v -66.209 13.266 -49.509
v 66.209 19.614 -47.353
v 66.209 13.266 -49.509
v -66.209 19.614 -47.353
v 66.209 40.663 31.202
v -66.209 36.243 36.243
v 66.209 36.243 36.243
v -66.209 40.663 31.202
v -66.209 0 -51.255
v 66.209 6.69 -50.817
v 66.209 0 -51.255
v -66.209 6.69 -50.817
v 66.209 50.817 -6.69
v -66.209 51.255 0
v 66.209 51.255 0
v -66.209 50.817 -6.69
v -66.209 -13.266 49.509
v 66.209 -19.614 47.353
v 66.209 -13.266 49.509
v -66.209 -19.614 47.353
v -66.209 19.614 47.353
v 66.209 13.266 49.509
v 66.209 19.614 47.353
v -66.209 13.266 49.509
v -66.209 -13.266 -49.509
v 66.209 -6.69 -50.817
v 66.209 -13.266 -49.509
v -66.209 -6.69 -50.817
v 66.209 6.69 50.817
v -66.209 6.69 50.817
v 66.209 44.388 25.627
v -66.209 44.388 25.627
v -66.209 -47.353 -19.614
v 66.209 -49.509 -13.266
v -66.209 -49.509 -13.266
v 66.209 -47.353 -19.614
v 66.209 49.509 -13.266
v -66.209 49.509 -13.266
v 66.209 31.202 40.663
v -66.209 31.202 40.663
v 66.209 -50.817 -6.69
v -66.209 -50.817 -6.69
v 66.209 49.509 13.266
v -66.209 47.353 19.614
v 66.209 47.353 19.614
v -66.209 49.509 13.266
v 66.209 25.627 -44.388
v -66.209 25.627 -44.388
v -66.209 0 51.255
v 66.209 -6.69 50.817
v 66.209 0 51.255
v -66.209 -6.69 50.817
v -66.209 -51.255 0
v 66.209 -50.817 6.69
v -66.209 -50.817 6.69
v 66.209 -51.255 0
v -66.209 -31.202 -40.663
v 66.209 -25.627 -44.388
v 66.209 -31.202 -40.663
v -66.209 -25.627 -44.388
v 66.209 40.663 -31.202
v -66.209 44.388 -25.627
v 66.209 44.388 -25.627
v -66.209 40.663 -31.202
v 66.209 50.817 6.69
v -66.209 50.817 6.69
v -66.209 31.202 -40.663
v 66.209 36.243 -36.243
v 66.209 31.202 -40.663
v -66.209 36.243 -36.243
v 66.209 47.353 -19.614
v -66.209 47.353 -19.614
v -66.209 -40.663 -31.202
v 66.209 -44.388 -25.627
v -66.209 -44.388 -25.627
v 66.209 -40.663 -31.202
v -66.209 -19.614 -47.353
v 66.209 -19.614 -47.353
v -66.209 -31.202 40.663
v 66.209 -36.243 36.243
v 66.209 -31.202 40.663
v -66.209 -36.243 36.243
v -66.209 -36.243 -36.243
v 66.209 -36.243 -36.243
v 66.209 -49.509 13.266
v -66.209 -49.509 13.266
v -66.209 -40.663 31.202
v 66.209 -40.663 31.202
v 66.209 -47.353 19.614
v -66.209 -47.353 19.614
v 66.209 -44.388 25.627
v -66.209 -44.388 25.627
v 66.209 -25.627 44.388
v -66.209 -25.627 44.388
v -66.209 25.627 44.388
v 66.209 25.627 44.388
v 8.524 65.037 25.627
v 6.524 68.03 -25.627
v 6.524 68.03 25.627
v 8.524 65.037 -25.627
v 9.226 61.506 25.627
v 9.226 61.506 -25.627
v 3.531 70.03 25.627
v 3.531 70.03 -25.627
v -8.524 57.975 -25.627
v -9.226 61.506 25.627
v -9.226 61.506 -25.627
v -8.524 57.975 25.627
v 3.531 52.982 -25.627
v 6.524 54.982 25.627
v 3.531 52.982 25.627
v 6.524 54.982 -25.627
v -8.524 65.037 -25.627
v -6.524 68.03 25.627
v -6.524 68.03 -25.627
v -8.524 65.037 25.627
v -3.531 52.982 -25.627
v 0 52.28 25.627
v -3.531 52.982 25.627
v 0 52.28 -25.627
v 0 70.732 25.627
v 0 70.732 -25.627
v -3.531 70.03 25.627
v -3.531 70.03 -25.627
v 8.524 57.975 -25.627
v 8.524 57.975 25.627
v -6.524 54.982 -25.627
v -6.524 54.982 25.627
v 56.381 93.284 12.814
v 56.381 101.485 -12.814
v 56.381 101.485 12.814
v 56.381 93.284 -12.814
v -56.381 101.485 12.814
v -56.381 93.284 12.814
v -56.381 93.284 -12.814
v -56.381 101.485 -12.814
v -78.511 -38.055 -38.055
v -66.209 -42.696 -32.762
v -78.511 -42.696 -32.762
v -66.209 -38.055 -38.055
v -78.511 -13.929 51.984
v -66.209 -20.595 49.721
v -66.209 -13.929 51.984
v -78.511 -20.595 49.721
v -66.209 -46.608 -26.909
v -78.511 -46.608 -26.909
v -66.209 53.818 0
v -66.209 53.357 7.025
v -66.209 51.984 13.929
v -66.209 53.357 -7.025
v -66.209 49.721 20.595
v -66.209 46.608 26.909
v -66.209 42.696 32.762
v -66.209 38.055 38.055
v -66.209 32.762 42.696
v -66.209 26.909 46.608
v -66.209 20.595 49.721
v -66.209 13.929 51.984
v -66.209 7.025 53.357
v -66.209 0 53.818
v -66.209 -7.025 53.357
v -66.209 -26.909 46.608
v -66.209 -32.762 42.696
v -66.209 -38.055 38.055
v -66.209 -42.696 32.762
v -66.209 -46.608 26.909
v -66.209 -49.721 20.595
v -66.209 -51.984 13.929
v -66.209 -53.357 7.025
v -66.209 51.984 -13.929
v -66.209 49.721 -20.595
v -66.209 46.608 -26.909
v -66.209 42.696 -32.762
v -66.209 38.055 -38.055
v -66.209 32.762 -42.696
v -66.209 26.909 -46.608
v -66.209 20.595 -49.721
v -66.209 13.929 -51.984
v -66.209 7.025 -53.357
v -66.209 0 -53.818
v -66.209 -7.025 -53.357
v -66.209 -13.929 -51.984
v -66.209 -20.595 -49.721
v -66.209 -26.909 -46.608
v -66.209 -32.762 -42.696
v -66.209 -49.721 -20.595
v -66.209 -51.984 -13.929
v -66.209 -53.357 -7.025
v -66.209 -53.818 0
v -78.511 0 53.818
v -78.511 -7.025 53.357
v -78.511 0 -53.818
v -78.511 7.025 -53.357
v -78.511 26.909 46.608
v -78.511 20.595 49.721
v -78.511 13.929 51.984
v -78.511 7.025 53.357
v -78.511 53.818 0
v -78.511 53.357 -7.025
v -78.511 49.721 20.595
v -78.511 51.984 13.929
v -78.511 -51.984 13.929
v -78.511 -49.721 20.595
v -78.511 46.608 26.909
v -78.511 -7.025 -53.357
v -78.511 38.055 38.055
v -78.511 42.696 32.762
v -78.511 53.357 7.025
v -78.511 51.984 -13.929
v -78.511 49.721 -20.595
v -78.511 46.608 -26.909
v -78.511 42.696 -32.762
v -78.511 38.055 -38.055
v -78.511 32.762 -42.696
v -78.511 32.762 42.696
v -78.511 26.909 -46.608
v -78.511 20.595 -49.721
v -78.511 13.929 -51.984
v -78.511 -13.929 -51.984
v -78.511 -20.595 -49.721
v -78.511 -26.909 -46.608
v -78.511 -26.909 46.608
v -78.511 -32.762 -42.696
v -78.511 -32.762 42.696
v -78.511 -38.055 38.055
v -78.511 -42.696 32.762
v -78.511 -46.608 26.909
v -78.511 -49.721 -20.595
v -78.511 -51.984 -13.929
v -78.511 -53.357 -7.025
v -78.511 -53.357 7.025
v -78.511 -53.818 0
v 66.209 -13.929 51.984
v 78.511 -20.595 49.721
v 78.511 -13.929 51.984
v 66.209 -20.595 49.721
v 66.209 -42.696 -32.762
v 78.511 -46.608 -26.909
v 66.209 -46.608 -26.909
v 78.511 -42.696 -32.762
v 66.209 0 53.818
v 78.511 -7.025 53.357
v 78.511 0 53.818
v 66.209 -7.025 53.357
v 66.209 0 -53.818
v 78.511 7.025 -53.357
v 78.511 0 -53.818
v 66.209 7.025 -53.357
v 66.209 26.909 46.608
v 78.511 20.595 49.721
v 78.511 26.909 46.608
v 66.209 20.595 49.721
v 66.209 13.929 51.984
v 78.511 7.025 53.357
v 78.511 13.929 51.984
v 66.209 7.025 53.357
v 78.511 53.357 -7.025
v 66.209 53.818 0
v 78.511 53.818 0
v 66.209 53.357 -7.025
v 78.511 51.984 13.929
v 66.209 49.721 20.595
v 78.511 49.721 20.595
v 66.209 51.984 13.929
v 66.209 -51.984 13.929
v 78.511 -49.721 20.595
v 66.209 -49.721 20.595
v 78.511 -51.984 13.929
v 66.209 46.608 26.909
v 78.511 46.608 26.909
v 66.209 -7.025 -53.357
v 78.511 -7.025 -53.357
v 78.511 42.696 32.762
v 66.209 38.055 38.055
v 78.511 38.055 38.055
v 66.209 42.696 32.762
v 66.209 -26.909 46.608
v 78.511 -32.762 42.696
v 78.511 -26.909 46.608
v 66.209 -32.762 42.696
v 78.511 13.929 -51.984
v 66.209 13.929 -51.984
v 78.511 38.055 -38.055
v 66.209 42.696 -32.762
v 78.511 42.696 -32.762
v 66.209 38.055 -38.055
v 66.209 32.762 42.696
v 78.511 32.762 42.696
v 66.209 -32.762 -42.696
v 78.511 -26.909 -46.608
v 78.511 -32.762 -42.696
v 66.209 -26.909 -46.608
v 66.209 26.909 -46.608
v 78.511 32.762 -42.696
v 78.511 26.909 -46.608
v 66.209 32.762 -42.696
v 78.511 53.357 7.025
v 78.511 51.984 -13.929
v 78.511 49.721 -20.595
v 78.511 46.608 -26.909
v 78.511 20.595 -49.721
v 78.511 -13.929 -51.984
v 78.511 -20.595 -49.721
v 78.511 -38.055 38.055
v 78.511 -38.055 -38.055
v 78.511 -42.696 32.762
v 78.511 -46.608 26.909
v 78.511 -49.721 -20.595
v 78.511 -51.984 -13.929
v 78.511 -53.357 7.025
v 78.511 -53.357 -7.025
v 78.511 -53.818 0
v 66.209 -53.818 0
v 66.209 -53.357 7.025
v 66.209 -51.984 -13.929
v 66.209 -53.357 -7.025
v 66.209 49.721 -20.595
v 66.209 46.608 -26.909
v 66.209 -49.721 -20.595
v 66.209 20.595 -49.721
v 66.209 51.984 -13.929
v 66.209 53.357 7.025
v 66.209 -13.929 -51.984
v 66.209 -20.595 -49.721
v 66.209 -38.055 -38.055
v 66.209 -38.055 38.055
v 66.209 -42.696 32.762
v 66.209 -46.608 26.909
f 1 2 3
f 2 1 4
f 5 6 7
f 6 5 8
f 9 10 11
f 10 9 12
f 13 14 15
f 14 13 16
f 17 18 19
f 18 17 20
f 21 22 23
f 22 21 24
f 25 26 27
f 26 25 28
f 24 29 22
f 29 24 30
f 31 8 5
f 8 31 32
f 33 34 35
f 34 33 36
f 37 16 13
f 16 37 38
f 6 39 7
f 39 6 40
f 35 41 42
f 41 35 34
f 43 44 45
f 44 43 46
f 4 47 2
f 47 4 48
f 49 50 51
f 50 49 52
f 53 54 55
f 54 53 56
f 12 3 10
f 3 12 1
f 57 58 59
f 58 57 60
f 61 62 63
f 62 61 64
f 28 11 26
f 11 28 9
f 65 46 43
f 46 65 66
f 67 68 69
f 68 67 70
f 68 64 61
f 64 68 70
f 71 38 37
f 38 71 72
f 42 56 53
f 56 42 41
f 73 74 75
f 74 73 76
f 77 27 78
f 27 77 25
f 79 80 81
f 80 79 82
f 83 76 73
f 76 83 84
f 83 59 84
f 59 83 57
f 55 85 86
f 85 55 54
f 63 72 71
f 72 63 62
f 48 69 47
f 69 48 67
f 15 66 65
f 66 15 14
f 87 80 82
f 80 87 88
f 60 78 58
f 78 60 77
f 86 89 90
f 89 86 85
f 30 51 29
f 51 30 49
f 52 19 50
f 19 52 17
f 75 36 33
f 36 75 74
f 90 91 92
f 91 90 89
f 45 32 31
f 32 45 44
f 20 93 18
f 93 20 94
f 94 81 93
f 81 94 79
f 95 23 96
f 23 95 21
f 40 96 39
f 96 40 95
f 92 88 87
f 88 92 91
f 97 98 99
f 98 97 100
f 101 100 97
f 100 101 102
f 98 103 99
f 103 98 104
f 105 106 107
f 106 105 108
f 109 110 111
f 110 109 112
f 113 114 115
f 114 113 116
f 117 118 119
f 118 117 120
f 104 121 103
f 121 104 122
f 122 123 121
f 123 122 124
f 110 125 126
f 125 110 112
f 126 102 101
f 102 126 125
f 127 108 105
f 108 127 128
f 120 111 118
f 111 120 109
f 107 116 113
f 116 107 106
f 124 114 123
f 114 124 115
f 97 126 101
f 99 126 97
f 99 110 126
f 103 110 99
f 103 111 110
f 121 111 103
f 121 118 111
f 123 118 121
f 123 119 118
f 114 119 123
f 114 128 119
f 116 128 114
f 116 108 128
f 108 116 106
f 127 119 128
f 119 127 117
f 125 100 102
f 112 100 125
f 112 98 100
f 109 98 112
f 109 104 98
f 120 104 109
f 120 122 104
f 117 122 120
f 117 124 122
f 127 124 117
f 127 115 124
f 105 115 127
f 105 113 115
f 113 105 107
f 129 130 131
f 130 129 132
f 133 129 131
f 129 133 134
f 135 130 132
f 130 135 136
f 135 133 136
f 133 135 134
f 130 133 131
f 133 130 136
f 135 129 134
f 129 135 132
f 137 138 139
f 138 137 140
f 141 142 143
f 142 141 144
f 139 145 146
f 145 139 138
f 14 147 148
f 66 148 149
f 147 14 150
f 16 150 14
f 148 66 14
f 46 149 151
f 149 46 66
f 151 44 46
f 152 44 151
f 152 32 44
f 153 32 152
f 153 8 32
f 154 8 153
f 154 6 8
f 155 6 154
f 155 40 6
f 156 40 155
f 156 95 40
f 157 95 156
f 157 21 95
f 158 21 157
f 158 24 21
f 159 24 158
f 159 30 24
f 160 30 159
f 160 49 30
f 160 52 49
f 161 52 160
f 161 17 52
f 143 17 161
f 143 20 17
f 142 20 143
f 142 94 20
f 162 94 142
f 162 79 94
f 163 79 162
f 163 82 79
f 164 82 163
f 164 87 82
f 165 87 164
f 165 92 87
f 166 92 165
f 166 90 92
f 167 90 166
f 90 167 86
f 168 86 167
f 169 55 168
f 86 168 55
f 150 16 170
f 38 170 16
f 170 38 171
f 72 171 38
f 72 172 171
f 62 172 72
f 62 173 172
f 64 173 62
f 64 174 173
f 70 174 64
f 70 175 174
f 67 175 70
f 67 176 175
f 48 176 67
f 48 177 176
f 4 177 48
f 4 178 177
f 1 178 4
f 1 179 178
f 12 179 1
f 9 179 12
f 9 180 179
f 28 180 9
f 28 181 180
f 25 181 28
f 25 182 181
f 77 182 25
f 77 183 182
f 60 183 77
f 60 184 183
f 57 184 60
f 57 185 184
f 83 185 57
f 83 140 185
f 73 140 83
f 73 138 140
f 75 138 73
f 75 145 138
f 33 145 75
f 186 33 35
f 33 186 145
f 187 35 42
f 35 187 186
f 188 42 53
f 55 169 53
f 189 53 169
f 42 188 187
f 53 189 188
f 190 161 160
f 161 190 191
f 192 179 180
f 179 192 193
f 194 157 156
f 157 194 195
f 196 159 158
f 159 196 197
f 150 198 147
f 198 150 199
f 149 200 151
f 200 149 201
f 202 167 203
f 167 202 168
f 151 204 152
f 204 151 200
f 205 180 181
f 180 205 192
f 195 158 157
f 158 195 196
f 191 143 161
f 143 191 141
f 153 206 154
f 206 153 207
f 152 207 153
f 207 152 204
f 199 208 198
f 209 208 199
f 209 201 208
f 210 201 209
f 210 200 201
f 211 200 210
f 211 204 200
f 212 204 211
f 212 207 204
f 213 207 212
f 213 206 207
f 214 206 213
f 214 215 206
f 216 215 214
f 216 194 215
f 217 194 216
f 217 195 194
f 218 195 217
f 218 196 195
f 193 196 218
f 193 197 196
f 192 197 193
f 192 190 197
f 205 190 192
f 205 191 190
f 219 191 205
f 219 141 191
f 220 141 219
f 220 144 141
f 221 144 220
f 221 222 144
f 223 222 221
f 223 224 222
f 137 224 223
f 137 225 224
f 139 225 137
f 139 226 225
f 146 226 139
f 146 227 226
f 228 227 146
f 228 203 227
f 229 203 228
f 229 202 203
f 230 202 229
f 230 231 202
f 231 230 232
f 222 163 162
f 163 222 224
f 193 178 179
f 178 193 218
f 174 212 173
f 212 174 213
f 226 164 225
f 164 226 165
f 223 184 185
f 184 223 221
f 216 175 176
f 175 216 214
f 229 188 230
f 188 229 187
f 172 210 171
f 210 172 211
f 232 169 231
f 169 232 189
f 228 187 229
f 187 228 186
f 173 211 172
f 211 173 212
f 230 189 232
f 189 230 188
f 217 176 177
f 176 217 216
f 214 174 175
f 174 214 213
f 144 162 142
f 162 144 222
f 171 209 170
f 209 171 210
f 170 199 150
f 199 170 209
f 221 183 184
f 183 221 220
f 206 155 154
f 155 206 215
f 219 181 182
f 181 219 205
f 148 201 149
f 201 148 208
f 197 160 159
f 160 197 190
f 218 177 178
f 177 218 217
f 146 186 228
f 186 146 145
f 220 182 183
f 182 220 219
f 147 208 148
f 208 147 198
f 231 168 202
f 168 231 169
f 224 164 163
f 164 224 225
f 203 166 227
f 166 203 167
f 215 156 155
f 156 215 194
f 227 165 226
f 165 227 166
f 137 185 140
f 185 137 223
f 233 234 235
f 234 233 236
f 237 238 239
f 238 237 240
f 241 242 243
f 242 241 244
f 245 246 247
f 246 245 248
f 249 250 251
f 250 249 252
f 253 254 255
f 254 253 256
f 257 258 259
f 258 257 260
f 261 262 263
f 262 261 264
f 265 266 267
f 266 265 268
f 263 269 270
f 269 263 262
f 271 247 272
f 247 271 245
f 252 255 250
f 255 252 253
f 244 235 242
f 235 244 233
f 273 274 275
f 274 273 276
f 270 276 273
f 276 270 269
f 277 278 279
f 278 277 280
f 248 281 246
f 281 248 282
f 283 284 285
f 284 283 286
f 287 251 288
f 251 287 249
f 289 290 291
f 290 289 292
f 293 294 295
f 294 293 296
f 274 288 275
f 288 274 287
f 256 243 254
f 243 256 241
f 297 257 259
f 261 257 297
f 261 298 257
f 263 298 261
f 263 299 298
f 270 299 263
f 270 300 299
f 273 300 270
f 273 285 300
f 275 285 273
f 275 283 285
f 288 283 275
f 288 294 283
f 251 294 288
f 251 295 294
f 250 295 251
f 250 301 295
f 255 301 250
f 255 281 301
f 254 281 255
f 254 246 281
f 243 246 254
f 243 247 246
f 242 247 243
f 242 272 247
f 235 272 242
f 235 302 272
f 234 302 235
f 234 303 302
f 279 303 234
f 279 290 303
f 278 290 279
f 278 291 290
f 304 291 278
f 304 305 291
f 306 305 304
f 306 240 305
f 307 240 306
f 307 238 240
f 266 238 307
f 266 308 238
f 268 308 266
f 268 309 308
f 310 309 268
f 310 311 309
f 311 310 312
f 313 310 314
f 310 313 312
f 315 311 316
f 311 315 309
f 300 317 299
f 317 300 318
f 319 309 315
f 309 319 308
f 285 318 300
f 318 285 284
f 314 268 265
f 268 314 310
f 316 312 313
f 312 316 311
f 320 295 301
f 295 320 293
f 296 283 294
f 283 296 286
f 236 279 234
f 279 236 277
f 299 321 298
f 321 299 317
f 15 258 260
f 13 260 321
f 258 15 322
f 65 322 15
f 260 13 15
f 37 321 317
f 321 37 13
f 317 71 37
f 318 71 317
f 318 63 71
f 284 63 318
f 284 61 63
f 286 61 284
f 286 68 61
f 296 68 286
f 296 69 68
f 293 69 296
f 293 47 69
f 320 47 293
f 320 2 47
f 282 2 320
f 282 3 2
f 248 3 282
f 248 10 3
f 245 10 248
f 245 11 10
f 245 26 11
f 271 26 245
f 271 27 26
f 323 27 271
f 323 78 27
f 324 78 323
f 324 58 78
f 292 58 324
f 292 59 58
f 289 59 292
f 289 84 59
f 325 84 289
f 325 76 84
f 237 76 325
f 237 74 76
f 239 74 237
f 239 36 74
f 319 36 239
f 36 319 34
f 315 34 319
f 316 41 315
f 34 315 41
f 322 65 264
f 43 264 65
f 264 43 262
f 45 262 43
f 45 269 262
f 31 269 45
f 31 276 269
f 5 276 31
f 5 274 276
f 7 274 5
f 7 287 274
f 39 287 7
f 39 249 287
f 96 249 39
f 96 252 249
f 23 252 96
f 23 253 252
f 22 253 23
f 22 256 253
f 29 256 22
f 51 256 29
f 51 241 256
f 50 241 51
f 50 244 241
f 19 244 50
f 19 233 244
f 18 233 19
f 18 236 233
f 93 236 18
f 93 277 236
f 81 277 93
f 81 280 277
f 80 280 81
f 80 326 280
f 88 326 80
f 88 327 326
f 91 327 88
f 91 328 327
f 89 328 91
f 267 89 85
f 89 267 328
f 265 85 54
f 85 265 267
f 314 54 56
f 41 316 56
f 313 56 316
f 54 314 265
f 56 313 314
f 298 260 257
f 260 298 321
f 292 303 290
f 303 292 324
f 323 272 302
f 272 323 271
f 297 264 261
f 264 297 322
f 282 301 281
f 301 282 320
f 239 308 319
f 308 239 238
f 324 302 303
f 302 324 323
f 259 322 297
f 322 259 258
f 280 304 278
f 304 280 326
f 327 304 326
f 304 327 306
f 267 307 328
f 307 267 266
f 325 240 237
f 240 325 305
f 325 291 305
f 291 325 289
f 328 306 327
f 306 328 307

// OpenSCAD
// Auto-generated by scripts/author_from_manifest.py (Phase D.3).
// Source: data/phase_d_manifest.json (sku_intent='watts-957-rpz-backflow-2in').
// Do not hand-edit — regenerate from the manifest.
//
// @part watts_957_rpz_backflow_2in
// @kind valve
// @category valve.backflow
// @display-name "Watts 957 RPZ Backflow Preventer 2\""
// @mfg watts_water
// @mfg-pn Series_957
// @listing UL FM
// @price-usd 2090.00
// @install-minutes 60
// @crew foreman
// @param size_in number default=2 label="Size" unit="in"
// @port inlet position=[-0.05,0,0] direction=[-1,0,0] style=grooved size_in=2 role=run_a
// @port outlet position=[0.05,0,0] direction=[1,0,0] style=grooved size_in=2 role=run_b

size_in = 2.0;

function od_mm(nps) =
    nps ==   1  ? 33.4 :
    nps == 1.25 ? 42.2 :
    nps == 1.5  ? 48.3 :
    nps ==   2  ? 60.3 :
    nps == 2.5  ? 73.0 :
    nps ==   3  ? 88.9 :
    nps ==   4  ? 114.3 :
    nps ==   6  ? 168.3 :
    nps ==   8  ? 219.1 : 73.0;

od = od_mm(size_in);
body_len = od * 2.4;
body_d   = od * 1.7;

union() {
    // Valve body
    rotate([0, 90, 0])
        cylinder(h = body_len, d = body_d, center = true, $fn = 48);
    // Stem / handle indicator
    translate([0, body_d * 0.6, 0])
        cylinder(h = body_d * 0.5, d = body_d * 0.18, center = true, $fn = 16);
    translate([0, body_d * 0.95, 0])
        cube([body_d * 1.1, body_d * 0.08, body_d * 0.25], center = true);
    // End flanges
    translate([-body_len/2, 0, 0])
        rotate([0, 90, 0])
        cylinder(h = body_d * 0.12, d = body_d * 1.05, center = true, $fn = 48);
    translate([ body_len/2, 0, 0])
        rotate([0, 90, 0])
        cylinder(h = body_d * 0.12, d = body_d * 1.05, center = true, $fn = 48);
}
